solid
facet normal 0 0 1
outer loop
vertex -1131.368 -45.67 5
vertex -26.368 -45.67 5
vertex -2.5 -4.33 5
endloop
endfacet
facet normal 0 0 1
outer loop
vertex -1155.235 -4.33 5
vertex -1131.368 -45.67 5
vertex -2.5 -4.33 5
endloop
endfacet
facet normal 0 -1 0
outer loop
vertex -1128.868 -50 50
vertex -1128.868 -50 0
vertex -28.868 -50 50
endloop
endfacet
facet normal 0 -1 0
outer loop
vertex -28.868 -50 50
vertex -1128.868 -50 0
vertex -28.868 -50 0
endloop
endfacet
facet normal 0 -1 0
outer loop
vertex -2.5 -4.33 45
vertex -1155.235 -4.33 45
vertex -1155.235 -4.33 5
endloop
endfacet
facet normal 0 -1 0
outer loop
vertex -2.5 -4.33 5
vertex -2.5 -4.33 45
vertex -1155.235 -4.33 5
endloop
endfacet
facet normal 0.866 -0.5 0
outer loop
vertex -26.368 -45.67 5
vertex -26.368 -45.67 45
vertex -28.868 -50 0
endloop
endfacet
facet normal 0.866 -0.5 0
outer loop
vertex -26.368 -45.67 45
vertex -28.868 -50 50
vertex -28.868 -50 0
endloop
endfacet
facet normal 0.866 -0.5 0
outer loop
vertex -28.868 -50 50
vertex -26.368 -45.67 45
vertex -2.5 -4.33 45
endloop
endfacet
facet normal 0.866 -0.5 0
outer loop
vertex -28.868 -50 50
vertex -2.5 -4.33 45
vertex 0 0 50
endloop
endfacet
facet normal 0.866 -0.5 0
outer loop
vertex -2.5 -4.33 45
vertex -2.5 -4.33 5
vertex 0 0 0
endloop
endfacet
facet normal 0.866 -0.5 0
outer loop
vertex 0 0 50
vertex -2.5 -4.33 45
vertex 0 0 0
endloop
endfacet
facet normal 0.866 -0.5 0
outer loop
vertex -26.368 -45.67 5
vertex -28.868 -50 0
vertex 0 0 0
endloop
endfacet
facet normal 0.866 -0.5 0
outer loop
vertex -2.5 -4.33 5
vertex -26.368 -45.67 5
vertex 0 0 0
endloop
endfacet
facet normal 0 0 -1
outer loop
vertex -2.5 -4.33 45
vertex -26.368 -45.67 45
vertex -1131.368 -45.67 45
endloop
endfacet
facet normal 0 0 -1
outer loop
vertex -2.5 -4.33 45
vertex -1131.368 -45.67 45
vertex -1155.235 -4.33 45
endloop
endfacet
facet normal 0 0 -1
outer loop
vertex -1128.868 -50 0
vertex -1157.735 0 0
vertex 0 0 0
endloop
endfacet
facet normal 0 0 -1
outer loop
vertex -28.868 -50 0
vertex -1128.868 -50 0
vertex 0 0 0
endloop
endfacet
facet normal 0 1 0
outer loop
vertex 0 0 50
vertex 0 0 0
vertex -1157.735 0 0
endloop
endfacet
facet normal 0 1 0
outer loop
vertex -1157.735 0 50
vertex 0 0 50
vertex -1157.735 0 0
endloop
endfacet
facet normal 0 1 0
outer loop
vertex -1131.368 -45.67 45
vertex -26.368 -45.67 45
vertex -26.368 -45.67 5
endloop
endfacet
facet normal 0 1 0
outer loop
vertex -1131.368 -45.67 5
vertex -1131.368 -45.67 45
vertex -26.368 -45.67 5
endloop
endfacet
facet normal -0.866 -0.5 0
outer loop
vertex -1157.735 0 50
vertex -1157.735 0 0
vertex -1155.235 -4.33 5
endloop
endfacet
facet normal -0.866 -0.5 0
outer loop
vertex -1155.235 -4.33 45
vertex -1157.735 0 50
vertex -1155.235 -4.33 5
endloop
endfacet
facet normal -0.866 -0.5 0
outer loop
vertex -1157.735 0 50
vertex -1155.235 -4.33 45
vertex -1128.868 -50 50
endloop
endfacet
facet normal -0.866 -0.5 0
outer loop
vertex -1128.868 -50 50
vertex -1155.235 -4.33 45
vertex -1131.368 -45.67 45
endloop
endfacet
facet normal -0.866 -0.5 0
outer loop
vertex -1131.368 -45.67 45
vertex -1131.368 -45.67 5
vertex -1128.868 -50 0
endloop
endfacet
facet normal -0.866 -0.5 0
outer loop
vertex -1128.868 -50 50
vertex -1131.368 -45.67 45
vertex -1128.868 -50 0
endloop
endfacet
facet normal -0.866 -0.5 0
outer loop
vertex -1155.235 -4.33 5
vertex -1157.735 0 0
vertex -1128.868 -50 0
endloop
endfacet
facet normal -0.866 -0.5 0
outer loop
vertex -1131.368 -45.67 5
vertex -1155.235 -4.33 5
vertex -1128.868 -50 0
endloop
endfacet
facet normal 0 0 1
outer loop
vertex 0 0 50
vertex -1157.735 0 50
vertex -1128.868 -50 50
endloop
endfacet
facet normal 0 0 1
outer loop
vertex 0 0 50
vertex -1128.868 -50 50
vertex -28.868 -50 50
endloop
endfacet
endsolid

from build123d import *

# Parameters (mm, degrees)
BOSS_EXTRUDE1_DEPTH = 50
SKETCH4_W           = 40
SKETCH4_H           = 47.735026919
CUT_EXTRUDE1_DEPTH  = 1340.48308574


with BuildPart() as part:
    # Sketch3 → Boss-Extrude1 (new body)
    with BuildSketch(Plane.XY):
        Polygon((0, 0), (-1157.735026919, 0), (-1128.867513459, -50), (-28.867513459, -50), align=None)
    extrude(amount=BOSS_EXTRUDE1_DEPTH)

    # Sketch4 → Cut-Extrude1 (cut, through all, along a direction that is not the sketch's normal)
    with BuildSketch(Plane(origin=(0, 0, 0), x_dir=(0, 0, -1), z_dir=(0.8660254037844366, -0.5000000000000037, 0))):
        with Locations((-25, -28.86751346)):
            Rectangle(SKETCH4_W, SKETCH4_H)
    extrude(amount=-CUT_EXTRUDE1_DEPTH, dir=(1, 0, 0), mode=Mode.SUBTRACT)


solid = part.part
